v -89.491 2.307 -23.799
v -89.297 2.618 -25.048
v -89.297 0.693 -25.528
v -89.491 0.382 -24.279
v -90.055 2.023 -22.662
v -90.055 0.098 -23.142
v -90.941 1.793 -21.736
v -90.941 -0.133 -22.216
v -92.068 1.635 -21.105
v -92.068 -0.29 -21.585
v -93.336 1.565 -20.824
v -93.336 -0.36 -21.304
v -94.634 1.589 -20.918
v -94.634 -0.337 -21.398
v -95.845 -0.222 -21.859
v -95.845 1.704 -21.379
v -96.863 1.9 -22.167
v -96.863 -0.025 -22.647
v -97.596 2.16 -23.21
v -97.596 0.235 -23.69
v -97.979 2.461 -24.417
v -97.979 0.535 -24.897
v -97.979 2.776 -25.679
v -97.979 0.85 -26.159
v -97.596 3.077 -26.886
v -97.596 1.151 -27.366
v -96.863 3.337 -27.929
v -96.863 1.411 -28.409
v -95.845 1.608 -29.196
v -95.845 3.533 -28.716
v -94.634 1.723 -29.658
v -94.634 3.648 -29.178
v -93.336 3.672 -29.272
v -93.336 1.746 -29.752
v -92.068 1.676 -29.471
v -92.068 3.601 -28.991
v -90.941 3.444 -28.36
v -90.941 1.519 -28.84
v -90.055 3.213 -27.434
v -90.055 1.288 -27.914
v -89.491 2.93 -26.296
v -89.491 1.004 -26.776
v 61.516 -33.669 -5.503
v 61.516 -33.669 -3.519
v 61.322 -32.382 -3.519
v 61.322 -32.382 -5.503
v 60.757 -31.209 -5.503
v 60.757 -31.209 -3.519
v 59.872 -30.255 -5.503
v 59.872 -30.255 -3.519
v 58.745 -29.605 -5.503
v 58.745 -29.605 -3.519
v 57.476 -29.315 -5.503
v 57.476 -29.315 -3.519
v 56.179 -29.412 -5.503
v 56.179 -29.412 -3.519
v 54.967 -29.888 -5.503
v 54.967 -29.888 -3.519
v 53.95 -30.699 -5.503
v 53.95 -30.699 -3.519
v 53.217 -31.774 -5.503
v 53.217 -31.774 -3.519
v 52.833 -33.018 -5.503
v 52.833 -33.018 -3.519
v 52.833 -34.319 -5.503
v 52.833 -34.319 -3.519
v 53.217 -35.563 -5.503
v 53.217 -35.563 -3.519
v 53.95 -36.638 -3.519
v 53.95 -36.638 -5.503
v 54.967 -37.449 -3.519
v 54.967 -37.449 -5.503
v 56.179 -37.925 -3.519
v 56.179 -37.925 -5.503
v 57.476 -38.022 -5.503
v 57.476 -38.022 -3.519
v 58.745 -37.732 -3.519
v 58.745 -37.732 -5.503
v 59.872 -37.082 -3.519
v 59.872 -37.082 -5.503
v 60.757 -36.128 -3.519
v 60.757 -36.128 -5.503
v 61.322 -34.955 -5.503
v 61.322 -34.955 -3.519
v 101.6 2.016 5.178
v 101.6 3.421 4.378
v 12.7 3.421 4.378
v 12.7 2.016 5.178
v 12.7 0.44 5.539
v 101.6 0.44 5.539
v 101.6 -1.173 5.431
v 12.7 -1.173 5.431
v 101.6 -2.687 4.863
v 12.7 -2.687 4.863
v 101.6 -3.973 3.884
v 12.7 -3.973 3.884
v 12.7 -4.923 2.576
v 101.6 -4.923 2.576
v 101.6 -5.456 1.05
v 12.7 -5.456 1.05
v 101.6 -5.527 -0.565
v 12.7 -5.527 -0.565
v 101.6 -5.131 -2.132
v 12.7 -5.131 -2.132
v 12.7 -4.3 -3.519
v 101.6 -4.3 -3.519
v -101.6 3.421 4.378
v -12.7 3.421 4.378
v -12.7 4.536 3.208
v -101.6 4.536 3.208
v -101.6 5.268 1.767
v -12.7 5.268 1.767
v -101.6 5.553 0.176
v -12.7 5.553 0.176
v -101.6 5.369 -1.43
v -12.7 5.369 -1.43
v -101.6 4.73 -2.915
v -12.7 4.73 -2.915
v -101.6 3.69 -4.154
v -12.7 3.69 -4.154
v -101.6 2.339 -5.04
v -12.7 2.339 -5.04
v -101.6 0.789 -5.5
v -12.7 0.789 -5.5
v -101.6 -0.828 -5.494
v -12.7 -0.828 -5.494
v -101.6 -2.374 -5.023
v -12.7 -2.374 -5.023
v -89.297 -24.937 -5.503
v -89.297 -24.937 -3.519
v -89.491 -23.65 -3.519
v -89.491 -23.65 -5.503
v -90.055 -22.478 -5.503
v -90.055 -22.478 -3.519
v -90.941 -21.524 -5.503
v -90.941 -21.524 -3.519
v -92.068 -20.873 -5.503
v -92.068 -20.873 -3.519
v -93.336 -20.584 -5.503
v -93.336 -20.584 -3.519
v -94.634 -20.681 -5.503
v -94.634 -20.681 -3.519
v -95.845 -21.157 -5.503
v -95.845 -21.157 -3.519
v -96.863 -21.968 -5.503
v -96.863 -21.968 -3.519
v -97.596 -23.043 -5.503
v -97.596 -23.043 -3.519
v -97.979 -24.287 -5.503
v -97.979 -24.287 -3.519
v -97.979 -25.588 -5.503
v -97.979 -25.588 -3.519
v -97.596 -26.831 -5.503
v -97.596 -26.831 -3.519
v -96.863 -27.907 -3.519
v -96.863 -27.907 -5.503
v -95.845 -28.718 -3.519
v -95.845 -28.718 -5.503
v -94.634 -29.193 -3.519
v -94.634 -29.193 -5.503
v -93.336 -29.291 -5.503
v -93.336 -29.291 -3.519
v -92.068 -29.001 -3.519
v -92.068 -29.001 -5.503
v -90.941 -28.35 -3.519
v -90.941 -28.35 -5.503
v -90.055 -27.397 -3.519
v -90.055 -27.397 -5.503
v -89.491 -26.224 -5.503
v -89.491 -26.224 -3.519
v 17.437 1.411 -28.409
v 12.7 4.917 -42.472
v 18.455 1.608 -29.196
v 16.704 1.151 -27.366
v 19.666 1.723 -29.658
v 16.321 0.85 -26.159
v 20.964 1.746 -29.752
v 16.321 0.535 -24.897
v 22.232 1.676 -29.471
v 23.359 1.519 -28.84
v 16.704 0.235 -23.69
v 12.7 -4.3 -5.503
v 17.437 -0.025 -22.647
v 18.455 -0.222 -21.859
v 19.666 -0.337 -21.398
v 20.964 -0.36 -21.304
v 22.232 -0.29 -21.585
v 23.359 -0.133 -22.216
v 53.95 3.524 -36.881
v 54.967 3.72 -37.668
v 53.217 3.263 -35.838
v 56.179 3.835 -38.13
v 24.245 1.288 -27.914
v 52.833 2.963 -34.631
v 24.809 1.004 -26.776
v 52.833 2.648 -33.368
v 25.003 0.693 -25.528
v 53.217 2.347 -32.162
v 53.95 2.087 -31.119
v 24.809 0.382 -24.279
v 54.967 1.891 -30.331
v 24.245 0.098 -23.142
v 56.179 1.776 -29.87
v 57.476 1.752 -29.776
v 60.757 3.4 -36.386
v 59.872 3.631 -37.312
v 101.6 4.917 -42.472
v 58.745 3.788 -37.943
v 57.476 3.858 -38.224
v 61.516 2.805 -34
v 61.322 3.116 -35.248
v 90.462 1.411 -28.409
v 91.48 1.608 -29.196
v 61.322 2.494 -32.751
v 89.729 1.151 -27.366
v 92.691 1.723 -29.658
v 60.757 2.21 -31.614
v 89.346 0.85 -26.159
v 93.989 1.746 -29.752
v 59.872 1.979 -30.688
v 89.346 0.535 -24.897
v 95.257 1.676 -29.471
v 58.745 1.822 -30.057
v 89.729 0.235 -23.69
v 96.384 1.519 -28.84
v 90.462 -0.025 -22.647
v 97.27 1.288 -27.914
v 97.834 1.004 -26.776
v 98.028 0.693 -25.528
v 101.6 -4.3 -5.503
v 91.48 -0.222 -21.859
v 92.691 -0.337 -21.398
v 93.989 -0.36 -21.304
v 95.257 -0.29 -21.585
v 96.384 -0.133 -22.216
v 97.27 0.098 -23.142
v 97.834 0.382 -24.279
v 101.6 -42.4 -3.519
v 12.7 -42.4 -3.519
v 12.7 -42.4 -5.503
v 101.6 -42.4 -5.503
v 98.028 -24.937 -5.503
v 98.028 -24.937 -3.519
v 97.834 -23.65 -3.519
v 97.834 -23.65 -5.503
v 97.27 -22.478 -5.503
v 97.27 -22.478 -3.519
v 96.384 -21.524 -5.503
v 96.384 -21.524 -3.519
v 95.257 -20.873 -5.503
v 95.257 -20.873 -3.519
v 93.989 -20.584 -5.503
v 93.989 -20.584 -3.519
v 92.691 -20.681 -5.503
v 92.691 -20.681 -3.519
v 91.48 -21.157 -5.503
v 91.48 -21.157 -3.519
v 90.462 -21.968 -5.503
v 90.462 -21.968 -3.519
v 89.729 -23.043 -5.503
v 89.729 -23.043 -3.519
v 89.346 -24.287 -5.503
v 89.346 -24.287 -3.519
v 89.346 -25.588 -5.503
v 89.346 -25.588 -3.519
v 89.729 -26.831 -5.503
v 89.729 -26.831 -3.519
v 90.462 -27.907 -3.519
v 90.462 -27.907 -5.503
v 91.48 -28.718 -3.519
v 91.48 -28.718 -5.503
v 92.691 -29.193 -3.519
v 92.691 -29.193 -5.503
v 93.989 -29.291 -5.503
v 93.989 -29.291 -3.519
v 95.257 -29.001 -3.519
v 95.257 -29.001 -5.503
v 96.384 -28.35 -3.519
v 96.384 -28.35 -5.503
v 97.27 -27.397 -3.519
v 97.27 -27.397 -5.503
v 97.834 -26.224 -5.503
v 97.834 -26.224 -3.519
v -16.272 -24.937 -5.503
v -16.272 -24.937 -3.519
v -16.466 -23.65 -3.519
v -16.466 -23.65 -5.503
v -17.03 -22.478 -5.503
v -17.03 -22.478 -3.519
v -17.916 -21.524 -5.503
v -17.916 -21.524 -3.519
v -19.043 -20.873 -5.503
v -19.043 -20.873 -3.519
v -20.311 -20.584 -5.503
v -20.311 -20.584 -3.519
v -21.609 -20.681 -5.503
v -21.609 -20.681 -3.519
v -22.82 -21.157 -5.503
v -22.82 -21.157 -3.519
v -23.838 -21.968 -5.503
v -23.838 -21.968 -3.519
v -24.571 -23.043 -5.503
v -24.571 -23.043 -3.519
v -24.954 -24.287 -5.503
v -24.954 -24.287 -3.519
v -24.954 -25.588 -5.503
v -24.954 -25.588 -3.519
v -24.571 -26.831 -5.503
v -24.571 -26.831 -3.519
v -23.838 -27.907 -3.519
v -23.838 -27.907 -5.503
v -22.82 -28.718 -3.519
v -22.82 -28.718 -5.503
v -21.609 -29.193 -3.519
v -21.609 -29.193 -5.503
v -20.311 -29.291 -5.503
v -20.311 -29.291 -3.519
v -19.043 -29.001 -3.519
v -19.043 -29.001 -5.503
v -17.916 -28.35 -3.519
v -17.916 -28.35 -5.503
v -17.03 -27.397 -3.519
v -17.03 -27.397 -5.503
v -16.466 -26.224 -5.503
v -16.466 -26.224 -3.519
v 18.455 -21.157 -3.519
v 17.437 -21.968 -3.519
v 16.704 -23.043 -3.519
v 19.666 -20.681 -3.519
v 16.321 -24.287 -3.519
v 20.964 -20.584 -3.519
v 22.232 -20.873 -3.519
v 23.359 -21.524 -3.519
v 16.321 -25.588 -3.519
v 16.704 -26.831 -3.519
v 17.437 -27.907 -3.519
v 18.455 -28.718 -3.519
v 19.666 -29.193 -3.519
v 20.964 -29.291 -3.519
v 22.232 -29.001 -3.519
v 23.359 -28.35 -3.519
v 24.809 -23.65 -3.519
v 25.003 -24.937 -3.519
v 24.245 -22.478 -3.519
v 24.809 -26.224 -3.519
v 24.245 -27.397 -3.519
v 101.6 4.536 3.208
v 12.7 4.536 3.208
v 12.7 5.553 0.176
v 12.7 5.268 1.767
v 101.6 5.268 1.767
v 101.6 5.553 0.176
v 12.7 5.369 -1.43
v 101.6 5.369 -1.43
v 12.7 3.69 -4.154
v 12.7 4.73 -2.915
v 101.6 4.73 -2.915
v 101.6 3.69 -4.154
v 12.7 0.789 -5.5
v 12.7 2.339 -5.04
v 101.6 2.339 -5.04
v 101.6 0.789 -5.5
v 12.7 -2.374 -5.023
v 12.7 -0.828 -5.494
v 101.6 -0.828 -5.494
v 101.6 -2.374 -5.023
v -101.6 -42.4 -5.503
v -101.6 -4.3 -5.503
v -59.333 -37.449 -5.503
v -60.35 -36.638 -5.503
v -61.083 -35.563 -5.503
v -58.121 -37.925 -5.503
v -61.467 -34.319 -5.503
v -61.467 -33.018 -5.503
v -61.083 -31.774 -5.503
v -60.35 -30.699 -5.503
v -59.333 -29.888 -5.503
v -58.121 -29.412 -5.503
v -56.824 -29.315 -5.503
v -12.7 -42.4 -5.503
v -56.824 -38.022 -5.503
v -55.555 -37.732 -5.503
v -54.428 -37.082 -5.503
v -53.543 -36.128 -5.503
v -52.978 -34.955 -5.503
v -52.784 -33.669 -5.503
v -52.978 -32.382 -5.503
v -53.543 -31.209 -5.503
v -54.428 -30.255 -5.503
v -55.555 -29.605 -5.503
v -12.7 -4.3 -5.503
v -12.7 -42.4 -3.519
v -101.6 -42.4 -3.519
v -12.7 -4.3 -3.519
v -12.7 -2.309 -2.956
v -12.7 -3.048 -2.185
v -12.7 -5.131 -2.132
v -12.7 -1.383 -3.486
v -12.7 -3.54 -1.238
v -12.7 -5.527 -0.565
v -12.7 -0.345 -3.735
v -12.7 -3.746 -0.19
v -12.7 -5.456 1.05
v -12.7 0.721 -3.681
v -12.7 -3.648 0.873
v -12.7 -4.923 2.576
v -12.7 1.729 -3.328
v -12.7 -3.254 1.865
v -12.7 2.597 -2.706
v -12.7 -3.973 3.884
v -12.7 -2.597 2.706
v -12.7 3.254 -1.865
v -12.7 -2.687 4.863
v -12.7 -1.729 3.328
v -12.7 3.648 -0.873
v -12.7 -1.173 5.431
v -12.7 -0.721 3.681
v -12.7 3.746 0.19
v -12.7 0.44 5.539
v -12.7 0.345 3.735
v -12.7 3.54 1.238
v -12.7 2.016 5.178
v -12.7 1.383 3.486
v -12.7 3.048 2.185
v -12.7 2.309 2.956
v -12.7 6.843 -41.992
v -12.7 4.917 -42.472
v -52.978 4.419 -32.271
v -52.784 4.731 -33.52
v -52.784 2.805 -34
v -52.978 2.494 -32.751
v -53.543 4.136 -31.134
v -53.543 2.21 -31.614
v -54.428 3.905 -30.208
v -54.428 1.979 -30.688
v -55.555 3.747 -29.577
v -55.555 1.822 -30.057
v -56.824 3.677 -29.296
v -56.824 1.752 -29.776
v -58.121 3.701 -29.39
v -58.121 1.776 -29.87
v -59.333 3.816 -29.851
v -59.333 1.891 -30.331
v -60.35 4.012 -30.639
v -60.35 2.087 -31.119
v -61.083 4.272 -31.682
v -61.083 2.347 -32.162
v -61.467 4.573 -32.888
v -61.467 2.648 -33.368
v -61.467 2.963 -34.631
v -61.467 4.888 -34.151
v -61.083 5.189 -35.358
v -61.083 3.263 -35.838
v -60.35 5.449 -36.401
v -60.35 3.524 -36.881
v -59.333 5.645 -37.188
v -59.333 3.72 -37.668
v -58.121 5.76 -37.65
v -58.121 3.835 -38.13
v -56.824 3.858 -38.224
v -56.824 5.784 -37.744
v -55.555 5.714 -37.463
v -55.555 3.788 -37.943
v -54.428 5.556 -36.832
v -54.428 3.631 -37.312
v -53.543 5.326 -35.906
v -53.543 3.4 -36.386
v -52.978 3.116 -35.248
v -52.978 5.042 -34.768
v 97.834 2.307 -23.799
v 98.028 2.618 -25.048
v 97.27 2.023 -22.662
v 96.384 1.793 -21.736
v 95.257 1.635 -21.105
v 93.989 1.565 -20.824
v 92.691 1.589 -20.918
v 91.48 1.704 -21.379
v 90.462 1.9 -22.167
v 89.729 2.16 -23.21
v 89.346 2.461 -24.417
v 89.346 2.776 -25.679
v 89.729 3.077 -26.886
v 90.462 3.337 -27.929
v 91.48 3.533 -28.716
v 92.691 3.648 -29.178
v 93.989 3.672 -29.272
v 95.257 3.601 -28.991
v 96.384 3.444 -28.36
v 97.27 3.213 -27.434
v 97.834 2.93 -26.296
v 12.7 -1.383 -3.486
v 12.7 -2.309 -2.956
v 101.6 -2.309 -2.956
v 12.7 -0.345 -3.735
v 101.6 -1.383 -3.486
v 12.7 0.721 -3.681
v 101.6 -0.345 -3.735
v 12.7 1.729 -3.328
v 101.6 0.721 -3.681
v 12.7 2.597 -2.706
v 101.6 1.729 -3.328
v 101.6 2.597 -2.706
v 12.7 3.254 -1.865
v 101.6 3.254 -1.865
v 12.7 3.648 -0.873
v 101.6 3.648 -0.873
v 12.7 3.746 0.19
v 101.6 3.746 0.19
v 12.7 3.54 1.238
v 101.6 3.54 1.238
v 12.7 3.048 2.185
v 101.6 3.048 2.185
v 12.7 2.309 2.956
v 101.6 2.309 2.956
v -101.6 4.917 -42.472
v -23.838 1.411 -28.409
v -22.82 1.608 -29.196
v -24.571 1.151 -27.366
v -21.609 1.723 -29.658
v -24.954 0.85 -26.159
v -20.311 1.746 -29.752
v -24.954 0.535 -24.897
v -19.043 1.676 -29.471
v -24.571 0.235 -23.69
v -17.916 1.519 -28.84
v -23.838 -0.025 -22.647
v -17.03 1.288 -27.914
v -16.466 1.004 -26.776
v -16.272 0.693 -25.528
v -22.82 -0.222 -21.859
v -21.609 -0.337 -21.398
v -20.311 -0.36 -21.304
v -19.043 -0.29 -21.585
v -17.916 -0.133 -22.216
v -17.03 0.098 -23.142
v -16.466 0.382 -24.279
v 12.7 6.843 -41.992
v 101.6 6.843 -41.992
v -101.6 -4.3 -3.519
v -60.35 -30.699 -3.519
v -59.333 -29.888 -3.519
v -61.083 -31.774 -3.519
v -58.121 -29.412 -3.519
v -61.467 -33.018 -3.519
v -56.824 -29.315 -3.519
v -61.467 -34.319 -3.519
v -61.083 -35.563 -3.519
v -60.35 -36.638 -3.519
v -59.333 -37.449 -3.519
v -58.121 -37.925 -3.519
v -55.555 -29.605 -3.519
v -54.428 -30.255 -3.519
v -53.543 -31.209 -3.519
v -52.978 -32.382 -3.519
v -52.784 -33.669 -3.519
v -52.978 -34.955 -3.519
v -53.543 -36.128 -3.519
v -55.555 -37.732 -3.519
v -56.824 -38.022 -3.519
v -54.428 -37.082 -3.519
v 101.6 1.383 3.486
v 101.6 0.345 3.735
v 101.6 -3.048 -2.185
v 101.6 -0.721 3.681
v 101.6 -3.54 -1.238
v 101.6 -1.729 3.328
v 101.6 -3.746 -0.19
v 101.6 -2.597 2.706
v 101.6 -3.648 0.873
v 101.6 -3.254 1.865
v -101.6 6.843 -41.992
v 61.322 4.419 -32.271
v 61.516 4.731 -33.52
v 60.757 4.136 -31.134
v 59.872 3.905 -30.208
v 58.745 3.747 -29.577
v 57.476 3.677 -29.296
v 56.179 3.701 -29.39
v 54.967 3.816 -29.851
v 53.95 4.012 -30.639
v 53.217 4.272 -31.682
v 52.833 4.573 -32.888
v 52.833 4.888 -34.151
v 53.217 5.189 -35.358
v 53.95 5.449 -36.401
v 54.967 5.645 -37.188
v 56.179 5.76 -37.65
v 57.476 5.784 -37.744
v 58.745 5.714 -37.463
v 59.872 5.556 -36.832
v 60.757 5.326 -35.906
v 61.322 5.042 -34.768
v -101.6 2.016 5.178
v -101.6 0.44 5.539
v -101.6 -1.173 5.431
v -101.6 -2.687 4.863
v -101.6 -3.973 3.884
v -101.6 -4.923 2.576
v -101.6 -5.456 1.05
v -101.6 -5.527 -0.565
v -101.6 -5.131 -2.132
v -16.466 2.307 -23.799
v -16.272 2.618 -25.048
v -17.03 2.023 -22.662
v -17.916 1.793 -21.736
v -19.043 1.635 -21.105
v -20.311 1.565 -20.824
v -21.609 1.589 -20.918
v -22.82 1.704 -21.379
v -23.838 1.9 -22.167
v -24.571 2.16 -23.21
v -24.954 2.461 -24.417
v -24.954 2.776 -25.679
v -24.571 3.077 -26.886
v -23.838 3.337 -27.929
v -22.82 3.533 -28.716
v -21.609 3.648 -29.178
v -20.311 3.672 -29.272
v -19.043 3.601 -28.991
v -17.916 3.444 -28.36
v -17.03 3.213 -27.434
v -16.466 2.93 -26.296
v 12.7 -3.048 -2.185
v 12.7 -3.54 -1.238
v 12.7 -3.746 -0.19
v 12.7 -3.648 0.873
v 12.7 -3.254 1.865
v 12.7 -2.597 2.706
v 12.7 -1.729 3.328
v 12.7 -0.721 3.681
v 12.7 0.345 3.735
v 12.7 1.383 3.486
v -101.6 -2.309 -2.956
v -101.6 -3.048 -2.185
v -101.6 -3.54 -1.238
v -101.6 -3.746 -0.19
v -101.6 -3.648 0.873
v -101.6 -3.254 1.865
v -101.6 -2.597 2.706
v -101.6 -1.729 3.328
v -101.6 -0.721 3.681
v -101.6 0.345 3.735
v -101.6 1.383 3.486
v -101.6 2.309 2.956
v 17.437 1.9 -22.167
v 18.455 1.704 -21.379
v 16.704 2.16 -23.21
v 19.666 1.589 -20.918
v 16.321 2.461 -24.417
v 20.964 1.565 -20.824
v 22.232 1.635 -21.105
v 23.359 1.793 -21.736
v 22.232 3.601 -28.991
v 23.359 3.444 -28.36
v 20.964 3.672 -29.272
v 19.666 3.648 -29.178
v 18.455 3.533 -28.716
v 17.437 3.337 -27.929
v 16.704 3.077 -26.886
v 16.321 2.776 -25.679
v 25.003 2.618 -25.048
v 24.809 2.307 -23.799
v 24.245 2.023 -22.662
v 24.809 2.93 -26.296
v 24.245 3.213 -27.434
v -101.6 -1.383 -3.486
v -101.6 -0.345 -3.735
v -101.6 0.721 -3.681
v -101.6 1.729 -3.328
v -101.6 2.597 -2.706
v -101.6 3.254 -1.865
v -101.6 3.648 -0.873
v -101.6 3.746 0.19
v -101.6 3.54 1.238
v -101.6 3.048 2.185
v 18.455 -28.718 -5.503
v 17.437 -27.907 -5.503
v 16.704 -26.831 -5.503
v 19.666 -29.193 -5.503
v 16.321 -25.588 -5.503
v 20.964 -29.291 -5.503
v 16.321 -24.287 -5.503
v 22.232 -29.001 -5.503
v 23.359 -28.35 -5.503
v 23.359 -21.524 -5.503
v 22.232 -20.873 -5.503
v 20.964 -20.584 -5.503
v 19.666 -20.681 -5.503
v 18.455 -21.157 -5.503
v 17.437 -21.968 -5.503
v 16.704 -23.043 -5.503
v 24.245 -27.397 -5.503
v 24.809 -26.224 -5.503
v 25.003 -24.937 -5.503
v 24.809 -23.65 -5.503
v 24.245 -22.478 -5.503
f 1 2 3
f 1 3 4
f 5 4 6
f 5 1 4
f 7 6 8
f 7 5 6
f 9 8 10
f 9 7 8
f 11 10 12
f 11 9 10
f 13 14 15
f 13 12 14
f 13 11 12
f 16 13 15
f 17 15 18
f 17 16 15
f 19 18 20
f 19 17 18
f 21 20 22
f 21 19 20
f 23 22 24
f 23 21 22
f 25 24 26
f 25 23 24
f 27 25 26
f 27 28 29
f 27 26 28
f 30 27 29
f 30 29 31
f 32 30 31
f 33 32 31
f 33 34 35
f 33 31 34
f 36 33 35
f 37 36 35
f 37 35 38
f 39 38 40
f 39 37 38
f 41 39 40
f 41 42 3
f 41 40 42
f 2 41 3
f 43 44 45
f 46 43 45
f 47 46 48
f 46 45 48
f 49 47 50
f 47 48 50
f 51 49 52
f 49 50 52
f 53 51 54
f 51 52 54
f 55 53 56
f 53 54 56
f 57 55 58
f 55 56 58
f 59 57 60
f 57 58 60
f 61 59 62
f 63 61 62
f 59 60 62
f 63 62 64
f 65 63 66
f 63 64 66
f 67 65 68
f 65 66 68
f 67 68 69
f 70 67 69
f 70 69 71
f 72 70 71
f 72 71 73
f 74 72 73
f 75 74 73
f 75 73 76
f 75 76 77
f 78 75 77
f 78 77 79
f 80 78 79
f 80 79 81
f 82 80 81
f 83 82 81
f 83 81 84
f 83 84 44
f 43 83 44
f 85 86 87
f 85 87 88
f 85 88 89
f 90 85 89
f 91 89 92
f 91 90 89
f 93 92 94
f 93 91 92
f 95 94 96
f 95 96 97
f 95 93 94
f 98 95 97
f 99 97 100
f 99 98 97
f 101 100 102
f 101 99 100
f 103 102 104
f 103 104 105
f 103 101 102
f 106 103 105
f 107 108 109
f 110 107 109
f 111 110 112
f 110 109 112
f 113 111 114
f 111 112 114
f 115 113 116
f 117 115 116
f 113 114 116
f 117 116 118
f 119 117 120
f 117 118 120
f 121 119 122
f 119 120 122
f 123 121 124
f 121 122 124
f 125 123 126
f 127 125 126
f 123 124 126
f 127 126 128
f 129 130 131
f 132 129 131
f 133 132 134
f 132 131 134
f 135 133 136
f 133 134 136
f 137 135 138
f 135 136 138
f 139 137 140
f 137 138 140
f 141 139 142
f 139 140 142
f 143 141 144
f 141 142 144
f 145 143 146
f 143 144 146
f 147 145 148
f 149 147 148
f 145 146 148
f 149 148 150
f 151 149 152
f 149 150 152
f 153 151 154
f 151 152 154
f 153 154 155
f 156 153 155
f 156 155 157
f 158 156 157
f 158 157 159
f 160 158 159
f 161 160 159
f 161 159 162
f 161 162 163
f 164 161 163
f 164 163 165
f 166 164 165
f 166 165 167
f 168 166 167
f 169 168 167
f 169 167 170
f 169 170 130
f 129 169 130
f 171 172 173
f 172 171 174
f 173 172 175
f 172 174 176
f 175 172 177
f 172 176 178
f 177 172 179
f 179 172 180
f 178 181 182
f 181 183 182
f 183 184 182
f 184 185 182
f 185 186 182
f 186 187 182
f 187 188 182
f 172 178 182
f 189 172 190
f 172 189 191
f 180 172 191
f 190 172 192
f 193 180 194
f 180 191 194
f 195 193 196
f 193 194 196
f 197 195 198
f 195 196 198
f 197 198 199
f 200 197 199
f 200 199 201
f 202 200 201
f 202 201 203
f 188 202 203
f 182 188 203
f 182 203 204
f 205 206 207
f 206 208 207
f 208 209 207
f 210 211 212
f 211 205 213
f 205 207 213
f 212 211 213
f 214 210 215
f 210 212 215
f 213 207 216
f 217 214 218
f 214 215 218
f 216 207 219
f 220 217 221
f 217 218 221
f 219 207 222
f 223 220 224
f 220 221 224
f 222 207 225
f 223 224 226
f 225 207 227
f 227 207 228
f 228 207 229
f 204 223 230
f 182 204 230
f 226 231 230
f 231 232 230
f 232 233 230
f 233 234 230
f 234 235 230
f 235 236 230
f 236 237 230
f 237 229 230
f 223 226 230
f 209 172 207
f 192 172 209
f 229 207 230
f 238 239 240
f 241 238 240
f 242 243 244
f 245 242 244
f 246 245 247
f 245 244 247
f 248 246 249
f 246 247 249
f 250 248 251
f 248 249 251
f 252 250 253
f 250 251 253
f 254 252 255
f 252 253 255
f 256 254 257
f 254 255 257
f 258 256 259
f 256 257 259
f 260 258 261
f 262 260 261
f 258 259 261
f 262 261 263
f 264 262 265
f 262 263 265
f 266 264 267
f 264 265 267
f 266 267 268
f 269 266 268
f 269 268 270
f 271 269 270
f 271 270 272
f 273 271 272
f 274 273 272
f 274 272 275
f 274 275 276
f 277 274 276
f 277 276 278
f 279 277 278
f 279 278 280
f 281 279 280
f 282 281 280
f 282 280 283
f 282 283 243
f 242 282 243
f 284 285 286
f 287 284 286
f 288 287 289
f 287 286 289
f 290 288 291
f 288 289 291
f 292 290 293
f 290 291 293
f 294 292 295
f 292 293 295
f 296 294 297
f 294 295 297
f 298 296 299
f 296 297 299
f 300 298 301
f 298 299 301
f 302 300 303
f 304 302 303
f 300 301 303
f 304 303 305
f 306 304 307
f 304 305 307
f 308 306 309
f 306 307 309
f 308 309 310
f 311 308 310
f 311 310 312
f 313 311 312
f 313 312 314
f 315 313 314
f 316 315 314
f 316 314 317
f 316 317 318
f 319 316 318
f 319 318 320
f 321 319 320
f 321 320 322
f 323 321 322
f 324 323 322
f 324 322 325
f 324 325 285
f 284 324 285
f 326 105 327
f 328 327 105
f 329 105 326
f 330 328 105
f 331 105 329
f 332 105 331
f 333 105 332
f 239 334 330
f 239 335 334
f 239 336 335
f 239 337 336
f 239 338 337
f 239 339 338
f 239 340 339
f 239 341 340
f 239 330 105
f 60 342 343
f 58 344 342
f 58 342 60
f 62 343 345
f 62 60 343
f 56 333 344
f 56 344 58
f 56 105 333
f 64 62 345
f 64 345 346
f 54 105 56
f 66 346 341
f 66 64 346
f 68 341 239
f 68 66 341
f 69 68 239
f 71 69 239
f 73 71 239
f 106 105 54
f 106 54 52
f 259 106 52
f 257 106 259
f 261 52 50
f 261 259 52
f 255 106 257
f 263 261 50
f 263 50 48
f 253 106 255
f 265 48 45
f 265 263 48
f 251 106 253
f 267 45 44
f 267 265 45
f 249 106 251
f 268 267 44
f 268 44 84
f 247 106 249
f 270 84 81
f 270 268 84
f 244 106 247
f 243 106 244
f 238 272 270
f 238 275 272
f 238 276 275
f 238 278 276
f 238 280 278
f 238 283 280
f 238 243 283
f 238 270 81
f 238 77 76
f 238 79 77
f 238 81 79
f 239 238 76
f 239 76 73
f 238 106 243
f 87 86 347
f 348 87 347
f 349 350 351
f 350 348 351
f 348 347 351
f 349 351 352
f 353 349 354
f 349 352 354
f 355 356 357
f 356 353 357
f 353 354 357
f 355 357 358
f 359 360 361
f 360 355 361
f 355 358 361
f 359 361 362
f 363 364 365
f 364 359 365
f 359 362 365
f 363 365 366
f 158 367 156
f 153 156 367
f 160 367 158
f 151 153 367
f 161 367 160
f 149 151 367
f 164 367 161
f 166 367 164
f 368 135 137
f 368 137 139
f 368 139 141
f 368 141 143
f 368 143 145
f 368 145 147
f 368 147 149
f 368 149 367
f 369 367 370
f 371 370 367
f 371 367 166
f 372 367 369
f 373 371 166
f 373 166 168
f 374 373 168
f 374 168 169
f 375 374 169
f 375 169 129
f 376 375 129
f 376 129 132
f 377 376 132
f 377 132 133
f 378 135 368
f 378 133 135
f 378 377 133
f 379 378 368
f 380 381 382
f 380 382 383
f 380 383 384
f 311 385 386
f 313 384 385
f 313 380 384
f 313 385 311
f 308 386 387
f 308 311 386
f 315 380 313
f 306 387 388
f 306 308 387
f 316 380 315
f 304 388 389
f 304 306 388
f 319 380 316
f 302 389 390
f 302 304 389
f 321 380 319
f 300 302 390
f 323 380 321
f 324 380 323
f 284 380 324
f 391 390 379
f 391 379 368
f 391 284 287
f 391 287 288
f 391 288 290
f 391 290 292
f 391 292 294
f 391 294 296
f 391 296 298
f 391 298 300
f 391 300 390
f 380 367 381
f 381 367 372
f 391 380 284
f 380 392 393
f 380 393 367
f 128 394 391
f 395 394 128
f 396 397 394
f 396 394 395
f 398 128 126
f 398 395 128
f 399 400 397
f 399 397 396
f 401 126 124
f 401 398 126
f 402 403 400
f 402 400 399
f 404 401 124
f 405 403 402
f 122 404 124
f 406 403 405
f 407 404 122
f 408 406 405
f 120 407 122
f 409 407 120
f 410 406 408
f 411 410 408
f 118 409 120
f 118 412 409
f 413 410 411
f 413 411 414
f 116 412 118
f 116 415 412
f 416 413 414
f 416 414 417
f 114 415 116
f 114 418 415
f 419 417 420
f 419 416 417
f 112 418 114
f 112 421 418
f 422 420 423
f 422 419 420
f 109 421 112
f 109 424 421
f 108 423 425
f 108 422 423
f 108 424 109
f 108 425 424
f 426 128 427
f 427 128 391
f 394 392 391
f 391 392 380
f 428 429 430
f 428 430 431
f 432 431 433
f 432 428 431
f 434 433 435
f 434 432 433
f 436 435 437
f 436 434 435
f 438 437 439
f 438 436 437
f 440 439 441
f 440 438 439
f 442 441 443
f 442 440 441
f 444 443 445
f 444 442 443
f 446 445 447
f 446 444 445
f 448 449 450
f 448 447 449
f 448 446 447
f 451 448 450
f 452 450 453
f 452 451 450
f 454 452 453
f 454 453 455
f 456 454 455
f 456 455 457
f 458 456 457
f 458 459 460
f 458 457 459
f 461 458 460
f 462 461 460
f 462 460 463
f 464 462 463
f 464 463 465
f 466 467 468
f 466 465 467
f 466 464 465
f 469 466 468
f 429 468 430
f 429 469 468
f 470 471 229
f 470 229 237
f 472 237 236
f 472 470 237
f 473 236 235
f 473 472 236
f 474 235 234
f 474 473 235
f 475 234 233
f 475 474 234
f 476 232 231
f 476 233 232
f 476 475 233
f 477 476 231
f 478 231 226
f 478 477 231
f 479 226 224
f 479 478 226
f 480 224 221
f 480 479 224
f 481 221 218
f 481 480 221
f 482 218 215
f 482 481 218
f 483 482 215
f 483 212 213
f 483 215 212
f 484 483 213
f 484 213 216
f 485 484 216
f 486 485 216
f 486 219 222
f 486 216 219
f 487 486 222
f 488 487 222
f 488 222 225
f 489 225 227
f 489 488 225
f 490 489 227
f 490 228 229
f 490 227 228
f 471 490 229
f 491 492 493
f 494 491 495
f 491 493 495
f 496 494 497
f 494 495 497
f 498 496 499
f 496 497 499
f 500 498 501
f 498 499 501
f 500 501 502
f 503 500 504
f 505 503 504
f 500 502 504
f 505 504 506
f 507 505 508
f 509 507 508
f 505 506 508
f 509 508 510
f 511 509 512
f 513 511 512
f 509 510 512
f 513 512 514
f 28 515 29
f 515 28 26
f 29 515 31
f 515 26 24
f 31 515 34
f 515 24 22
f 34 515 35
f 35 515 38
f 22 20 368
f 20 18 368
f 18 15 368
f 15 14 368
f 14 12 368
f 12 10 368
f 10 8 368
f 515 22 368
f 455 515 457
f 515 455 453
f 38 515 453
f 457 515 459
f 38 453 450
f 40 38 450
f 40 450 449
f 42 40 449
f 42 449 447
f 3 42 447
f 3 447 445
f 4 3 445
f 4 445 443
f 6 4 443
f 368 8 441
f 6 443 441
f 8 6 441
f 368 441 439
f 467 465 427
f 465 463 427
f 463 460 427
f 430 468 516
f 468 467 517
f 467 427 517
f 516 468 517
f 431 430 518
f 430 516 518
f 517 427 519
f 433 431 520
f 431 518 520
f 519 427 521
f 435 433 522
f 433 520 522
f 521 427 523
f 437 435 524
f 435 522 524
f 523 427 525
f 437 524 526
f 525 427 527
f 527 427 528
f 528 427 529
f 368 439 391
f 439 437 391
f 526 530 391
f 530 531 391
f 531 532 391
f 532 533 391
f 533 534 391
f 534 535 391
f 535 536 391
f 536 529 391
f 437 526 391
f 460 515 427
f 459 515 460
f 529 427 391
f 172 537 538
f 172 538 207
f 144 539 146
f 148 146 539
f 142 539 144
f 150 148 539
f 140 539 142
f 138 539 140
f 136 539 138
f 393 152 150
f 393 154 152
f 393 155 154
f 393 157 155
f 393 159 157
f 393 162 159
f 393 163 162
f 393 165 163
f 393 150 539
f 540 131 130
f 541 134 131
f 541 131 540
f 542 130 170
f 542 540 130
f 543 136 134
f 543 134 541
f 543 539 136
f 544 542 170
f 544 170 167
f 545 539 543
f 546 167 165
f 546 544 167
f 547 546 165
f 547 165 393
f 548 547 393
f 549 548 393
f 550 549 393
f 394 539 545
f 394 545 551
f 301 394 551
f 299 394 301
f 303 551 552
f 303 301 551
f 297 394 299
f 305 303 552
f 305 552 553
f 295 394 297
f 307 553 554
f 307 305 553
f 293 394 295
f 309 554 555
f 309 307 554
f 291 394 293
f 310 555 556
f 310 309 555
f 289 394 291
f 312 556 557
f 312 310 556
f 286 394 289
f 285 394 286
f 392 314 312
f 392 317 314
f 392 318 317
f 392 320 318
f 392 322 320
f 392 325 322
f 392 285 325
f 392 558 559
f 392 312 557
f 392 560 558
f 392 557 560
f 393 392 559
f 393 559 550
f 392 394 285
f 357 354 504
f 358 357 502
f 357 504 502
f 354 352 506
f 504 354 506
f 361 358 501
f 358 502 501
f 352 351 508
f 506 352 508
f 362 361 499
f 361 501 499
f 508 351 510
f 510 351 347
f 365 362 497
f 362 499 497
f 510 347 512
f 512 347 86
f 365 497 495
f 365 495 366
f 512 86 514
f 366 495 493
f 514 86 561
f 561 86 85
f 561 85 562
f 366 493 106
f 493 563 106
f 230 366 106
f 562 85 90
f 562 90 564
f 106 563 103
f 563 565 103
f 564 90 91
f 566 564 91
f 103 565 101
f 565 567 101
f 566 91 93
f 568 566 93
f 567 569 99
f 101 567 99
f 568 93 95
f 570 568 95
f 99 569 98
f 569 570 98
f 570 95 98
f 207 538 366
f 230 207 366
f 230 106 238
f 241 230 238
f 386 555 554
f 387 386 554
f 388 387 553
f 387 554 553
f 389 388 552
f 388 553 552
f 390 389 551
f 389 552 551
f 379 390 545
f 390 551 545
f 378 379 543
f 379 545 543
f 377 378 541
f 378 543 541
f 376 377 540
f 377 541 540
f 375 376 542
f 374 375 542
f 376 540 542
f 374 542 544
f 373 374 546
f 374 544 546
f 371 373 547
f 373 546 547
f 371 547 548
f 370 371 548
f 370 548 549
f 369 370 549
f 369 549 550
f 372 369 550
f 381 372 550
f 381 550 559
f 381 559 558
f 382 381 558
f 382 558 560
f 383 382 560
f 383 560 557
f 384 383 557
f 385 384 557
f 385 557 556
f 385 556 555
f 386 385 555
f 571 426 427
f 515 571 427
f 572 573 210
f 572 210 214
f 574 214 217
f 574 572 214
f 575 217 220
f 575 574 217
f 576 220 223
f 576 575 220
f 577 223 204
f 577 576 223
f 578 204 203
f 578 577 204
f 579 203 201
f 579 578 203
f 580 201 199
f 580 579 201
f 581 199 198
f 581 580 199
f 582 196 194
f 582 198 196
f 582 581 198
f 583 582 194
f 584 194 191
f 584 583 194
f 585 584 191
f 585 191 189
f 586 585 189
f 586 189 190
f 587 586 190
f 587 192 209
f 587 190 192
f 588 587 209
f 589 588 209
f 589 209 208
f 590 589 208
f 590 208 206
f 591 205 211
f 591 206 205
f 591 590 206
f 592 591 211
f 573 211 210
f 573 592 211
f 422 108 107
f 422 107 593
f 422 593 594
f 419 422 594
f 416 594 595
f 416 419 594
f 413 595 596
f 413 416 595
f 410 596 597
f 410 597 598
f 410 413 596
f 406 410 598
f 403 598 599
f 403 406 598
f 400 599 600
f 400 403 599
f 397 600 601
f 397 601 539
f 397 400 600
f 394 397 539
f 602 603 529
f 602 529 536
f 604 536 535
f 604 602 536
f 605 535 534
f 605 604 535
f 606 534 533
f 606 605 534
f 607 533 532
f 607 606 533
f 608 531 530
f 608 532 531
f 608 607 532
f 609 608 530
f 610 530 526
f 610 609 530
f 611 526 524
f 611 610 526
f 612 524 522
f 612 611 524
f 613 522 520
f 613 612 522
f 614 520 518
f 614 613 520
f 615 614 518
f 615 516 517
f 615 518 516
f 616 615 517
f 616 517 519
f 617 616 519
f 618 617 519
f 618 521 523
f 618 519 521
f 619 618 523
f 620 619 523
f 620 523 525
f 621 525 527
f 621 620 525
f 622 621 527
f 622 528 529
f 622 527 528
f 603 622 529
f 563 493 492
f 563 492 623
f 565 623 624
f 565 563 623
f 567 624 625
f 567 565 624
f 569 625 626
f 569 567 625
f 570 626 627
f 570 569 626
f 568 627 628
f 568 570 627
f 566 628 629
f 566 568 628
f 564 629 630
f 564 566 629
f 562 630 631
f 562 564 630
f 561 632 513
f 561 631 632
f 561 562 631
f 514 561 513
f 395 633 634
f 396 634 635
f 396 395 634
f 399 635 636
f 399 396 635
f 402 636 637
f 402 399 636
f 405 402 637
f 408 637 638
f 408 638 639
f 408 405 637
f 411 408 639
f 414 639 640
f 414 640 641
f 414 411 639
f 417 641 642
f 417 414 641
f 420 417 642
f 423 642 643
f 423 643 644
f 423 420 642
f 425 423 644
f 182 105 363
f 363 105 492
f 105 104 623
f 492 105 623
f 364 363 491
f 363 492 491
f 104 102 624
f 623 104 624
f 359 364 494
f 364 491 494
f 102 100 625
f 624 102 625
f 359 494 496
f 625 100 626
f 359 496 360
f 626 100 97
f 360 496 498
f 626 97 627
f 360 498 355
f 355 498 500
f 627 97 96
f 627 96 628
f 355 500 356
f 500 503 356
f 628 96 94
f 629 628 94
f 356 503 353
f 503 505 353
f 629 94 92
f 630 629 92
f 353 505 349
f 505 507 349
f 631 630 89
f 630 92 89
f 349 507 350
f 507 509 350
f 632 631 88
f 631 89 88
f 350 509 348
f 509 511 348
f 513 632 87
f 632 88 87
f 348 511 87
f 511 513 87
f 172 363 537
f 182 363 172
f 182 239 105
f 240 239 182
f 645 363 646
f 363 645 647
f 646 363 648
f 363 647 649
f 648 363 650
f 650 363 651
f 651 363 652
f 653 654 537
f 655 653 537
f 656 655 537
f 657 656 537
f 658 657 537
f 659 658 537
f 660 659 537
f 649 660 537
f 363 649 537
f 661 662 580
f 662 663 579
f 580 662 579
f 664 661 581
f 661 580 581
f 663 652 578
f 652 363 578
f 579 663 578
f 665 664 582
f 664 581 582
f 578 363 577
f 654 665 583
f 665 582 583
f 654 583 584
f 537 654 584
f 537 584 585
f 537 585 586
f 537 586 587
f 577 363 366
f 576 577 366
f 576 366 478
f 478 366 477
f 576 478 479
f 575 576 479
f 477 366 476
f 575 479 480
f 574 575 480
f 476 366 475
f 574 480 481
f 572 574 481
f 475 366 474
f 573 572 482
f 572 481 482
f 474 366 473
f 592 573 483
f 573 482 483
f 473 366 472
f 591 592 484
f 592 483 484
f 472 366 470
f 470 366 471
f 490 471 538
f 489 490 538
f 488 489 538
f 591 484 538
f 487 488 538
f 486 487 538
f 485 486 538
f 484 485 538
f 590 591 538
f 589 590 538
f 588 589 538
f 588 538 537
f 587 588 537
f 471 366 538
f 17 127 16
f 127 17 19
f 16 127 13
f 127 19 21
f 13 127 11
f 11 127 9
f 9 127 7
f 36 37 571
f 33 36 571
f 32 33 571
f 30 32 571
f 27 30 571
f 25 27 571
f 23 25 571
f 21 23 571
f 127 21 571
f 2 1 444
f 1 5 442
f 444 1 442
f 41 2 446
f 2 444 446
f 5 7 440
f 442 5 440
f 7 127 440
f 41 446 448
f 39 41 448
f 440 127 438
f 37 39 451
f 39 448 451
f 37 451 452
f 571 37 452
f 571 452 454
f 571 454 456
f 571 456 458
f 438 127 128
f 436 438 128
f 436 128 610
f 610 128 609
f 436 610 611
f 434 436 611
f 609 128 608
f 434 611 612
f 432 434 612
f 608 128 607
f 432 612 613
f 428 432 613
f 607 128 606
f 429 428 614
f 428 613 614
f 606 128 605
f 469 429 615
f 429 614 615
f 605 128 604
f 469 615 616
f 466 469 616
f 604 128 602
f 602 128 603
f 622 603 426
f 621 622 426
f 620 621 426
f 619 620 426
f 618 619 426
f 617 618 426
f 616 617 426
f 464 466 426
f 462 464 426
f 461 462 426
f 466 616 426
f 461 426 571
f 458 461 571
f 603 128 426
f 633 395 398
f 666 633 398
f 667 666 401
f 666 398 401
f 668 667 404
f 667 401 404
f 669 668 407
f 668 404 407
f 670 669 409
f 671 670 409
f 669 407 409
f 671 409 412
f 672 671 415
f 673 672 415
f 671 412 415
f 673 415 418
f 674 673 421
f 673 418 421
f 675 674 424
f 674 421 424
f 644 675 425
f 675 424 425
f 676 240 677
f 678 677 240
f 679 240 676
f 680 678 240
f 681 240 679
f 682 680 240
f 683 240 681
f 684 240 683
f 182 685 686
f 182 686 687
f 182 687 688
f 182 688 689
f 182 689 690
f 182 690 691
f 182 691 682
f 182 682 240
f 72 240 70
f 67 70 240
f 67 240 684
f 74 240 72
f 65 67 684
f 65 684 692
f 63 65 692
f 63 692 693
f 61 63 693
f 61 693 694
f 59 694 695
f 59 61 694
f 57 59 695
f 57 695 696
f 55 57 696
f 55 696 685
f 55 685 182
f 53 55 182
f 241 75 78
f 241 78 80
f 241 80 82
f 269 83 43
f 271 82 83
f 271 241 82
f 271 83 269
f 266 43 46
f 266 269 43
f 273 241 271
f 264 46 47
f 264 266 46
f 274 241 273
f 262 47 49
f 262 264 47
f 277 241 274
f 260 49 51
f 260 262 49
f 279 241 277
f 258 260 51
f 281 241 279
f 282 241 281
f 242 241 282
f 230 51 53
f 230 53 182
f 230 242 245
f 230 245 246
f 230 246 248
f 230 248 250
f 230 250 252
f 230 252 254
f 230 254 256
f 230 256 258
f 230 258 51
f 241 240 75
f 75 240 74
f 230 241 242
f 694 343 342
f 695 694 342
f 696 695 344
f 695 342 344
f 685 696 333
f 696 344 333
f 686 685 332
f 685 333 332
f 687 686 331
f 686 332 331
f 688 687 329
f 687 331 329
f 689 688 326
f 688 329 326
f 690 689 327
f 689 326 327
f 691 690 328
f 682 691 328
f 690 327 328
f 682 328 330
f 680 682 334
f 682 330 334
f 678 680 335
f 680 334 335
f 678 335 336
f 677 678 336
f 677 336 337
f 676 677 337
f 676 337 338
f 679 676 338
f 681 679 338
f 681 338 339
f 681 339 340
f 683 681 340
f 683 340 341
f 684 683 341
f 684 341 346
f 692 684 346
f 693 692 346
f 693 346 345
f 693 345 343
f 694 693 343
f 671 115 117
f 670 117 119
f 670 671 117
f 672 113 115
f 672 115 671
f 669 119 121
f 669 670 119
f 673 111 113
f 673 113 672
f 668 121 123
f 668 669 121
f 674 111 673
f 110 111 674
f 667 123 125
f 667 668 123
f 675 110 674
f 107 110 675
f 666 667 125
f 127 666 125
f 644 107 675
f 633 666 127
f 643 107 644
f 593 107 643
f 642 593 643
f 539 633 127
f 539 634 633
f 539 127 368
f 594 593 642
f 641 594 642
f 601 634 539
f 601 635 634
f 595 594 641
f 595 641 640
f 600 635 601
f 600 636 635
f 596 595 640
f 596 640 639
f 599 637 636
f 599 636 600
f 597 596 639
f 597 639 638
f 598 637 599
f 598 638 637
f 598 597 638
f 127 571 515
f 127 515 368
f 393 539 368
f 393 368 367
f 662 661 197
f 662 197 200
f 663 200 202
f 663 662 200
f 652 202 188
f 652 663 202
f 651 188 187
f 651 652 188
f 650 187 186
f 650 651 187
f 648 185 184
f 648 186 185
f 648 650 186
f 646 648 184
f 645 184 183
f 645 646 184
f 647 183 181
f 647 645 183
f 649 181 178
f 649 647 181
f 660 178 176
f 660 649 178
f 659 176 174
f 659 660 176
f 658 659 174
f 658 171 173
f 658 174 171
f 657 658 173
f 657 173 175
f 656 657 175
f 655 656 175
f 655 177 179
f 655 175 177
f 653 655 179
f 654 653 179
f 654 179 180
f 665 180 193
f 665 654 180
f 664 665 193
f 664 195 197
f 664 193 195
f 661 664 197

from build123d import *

# Parameters (mm, degrees)
BOSS_EXTRUDE1_DEPTH = 101.6
SKETCH2_R           = 4.365625
SKETCH2_W           = 25.4
SKETCH2_H           = 52.737821571
CUT_EXTRUDE1_DEPTH  = 111.232355814


with BuildPart() as part:
    # Sketch1 → Boss-Extrude1 (new, symmetric)
    with BuildSketch(Plane(origin=(0, 0, 0), x_dir=(0, 0, -1), z_dir=(1, 0, 0))):
        with BuildLine():
            Line((-2.955552608, 2.309130771), (-4.37838475, 3.420769072))
            ThreePointArc((-4.37838475, 3.420769072), (-3.884105647, -3.973114318), (3.519077491, -4.299768328))
            Line((3.519077491, -4.299768328), (3.519077491, -42.399768328))
            Line((3.519077491, -42.399768328), (5.503452491, -42.399768328))
            Line((5.503452491, -42.399768328), (5.503452491, -4.299768328))
            Line((5.503452491, -4.299768328), (2.955552608, -2.309130771))
            ThreePointArc((2.955552608, -2.309130771), (-2.309130771, -2.955552608), (-2.955552608, 2.309130771))
        make_face()
    boss_extrude1 = extrude(amount=BOSS_EXTRUDE1_DEPTH, both=True)

    # Sketch2 → Cut-Extrude1 (cut, symmetric)
    with BuildSketch(Plane.XY):
        with Locations((-93.6625, -24.937268328)):
            Circle(SKETCH2_R)
        with Locations((-20.6375, -24.937268328)):
            Circle(SKETCH2_R)
        with Locations((20.6375, -24.937268328)):
            Circle(SKETCH2_R)
        with Locations((93.6625, -24.937268328)):
            Circle(SKETCH2_R)
        with Locations((-57.15, -33.668518328)):
            Circle(SKETCH2_R)
        with Locations((57.15, -33.668518328)):
            Circle(SKETCH2_R)
        with Locations((0, -16.030857543)):
            Rectangle(SKETCH2_W, SKETCH2_H)
    cut_extrude1 = extrude(amount=CUT_EXTRUDE1_DEPTH, both=True, mode=Mode.SUBTRACT)


with BuildPart() as cut_extrude1_piece_1:
    # of the separate pieces the step leaves, piece 1, a body of its own (cut_extrude1_pieces)
    add(part.part.solids().sort_by_distance((101.6, -2.309130771, -2.955552608))[0])



with BuildPart() as cut_extrude1_piece_2:
    # of the separate pieces the step leaves, piece 2, a body of its own (cut_extrude1_pieces)
    add(part.part.solids().sort_by_distance((-12.7, -2.309130771, -2.955552608))[0])


with BuildPart() as cut_extrude1_piece_1_1:
    add(cut_extrude1_piece_1.part)

    add(cut_extrude1_piece_2.part)  # Mirror2 merges Cut-Extrude1 piece 2
    # Mirror2: Boss-Extrude1 across plane
    add(boss_extrude1.mirror(Plane(origin=(101.6, 0, 0), x_dir=(0, 0.6156614753256557, 0.7880107536067239), z_dir=(0, 0.788010753606724, -0.6156614753256557))))

    # Mirror2 2: Cut-Extrude1 across plane
    add(cut_extrude1.mirror(Plane(origin=(101.6, 0, 0), x_dir=(0, 0.6156614753256557, 0.7880107536067239), z_dir=(0, 0.788010753606724, -0.6156614753256557))), mode=Mode.SUBTRACT)


solid = cut_extrude1_piece_1_1.part
